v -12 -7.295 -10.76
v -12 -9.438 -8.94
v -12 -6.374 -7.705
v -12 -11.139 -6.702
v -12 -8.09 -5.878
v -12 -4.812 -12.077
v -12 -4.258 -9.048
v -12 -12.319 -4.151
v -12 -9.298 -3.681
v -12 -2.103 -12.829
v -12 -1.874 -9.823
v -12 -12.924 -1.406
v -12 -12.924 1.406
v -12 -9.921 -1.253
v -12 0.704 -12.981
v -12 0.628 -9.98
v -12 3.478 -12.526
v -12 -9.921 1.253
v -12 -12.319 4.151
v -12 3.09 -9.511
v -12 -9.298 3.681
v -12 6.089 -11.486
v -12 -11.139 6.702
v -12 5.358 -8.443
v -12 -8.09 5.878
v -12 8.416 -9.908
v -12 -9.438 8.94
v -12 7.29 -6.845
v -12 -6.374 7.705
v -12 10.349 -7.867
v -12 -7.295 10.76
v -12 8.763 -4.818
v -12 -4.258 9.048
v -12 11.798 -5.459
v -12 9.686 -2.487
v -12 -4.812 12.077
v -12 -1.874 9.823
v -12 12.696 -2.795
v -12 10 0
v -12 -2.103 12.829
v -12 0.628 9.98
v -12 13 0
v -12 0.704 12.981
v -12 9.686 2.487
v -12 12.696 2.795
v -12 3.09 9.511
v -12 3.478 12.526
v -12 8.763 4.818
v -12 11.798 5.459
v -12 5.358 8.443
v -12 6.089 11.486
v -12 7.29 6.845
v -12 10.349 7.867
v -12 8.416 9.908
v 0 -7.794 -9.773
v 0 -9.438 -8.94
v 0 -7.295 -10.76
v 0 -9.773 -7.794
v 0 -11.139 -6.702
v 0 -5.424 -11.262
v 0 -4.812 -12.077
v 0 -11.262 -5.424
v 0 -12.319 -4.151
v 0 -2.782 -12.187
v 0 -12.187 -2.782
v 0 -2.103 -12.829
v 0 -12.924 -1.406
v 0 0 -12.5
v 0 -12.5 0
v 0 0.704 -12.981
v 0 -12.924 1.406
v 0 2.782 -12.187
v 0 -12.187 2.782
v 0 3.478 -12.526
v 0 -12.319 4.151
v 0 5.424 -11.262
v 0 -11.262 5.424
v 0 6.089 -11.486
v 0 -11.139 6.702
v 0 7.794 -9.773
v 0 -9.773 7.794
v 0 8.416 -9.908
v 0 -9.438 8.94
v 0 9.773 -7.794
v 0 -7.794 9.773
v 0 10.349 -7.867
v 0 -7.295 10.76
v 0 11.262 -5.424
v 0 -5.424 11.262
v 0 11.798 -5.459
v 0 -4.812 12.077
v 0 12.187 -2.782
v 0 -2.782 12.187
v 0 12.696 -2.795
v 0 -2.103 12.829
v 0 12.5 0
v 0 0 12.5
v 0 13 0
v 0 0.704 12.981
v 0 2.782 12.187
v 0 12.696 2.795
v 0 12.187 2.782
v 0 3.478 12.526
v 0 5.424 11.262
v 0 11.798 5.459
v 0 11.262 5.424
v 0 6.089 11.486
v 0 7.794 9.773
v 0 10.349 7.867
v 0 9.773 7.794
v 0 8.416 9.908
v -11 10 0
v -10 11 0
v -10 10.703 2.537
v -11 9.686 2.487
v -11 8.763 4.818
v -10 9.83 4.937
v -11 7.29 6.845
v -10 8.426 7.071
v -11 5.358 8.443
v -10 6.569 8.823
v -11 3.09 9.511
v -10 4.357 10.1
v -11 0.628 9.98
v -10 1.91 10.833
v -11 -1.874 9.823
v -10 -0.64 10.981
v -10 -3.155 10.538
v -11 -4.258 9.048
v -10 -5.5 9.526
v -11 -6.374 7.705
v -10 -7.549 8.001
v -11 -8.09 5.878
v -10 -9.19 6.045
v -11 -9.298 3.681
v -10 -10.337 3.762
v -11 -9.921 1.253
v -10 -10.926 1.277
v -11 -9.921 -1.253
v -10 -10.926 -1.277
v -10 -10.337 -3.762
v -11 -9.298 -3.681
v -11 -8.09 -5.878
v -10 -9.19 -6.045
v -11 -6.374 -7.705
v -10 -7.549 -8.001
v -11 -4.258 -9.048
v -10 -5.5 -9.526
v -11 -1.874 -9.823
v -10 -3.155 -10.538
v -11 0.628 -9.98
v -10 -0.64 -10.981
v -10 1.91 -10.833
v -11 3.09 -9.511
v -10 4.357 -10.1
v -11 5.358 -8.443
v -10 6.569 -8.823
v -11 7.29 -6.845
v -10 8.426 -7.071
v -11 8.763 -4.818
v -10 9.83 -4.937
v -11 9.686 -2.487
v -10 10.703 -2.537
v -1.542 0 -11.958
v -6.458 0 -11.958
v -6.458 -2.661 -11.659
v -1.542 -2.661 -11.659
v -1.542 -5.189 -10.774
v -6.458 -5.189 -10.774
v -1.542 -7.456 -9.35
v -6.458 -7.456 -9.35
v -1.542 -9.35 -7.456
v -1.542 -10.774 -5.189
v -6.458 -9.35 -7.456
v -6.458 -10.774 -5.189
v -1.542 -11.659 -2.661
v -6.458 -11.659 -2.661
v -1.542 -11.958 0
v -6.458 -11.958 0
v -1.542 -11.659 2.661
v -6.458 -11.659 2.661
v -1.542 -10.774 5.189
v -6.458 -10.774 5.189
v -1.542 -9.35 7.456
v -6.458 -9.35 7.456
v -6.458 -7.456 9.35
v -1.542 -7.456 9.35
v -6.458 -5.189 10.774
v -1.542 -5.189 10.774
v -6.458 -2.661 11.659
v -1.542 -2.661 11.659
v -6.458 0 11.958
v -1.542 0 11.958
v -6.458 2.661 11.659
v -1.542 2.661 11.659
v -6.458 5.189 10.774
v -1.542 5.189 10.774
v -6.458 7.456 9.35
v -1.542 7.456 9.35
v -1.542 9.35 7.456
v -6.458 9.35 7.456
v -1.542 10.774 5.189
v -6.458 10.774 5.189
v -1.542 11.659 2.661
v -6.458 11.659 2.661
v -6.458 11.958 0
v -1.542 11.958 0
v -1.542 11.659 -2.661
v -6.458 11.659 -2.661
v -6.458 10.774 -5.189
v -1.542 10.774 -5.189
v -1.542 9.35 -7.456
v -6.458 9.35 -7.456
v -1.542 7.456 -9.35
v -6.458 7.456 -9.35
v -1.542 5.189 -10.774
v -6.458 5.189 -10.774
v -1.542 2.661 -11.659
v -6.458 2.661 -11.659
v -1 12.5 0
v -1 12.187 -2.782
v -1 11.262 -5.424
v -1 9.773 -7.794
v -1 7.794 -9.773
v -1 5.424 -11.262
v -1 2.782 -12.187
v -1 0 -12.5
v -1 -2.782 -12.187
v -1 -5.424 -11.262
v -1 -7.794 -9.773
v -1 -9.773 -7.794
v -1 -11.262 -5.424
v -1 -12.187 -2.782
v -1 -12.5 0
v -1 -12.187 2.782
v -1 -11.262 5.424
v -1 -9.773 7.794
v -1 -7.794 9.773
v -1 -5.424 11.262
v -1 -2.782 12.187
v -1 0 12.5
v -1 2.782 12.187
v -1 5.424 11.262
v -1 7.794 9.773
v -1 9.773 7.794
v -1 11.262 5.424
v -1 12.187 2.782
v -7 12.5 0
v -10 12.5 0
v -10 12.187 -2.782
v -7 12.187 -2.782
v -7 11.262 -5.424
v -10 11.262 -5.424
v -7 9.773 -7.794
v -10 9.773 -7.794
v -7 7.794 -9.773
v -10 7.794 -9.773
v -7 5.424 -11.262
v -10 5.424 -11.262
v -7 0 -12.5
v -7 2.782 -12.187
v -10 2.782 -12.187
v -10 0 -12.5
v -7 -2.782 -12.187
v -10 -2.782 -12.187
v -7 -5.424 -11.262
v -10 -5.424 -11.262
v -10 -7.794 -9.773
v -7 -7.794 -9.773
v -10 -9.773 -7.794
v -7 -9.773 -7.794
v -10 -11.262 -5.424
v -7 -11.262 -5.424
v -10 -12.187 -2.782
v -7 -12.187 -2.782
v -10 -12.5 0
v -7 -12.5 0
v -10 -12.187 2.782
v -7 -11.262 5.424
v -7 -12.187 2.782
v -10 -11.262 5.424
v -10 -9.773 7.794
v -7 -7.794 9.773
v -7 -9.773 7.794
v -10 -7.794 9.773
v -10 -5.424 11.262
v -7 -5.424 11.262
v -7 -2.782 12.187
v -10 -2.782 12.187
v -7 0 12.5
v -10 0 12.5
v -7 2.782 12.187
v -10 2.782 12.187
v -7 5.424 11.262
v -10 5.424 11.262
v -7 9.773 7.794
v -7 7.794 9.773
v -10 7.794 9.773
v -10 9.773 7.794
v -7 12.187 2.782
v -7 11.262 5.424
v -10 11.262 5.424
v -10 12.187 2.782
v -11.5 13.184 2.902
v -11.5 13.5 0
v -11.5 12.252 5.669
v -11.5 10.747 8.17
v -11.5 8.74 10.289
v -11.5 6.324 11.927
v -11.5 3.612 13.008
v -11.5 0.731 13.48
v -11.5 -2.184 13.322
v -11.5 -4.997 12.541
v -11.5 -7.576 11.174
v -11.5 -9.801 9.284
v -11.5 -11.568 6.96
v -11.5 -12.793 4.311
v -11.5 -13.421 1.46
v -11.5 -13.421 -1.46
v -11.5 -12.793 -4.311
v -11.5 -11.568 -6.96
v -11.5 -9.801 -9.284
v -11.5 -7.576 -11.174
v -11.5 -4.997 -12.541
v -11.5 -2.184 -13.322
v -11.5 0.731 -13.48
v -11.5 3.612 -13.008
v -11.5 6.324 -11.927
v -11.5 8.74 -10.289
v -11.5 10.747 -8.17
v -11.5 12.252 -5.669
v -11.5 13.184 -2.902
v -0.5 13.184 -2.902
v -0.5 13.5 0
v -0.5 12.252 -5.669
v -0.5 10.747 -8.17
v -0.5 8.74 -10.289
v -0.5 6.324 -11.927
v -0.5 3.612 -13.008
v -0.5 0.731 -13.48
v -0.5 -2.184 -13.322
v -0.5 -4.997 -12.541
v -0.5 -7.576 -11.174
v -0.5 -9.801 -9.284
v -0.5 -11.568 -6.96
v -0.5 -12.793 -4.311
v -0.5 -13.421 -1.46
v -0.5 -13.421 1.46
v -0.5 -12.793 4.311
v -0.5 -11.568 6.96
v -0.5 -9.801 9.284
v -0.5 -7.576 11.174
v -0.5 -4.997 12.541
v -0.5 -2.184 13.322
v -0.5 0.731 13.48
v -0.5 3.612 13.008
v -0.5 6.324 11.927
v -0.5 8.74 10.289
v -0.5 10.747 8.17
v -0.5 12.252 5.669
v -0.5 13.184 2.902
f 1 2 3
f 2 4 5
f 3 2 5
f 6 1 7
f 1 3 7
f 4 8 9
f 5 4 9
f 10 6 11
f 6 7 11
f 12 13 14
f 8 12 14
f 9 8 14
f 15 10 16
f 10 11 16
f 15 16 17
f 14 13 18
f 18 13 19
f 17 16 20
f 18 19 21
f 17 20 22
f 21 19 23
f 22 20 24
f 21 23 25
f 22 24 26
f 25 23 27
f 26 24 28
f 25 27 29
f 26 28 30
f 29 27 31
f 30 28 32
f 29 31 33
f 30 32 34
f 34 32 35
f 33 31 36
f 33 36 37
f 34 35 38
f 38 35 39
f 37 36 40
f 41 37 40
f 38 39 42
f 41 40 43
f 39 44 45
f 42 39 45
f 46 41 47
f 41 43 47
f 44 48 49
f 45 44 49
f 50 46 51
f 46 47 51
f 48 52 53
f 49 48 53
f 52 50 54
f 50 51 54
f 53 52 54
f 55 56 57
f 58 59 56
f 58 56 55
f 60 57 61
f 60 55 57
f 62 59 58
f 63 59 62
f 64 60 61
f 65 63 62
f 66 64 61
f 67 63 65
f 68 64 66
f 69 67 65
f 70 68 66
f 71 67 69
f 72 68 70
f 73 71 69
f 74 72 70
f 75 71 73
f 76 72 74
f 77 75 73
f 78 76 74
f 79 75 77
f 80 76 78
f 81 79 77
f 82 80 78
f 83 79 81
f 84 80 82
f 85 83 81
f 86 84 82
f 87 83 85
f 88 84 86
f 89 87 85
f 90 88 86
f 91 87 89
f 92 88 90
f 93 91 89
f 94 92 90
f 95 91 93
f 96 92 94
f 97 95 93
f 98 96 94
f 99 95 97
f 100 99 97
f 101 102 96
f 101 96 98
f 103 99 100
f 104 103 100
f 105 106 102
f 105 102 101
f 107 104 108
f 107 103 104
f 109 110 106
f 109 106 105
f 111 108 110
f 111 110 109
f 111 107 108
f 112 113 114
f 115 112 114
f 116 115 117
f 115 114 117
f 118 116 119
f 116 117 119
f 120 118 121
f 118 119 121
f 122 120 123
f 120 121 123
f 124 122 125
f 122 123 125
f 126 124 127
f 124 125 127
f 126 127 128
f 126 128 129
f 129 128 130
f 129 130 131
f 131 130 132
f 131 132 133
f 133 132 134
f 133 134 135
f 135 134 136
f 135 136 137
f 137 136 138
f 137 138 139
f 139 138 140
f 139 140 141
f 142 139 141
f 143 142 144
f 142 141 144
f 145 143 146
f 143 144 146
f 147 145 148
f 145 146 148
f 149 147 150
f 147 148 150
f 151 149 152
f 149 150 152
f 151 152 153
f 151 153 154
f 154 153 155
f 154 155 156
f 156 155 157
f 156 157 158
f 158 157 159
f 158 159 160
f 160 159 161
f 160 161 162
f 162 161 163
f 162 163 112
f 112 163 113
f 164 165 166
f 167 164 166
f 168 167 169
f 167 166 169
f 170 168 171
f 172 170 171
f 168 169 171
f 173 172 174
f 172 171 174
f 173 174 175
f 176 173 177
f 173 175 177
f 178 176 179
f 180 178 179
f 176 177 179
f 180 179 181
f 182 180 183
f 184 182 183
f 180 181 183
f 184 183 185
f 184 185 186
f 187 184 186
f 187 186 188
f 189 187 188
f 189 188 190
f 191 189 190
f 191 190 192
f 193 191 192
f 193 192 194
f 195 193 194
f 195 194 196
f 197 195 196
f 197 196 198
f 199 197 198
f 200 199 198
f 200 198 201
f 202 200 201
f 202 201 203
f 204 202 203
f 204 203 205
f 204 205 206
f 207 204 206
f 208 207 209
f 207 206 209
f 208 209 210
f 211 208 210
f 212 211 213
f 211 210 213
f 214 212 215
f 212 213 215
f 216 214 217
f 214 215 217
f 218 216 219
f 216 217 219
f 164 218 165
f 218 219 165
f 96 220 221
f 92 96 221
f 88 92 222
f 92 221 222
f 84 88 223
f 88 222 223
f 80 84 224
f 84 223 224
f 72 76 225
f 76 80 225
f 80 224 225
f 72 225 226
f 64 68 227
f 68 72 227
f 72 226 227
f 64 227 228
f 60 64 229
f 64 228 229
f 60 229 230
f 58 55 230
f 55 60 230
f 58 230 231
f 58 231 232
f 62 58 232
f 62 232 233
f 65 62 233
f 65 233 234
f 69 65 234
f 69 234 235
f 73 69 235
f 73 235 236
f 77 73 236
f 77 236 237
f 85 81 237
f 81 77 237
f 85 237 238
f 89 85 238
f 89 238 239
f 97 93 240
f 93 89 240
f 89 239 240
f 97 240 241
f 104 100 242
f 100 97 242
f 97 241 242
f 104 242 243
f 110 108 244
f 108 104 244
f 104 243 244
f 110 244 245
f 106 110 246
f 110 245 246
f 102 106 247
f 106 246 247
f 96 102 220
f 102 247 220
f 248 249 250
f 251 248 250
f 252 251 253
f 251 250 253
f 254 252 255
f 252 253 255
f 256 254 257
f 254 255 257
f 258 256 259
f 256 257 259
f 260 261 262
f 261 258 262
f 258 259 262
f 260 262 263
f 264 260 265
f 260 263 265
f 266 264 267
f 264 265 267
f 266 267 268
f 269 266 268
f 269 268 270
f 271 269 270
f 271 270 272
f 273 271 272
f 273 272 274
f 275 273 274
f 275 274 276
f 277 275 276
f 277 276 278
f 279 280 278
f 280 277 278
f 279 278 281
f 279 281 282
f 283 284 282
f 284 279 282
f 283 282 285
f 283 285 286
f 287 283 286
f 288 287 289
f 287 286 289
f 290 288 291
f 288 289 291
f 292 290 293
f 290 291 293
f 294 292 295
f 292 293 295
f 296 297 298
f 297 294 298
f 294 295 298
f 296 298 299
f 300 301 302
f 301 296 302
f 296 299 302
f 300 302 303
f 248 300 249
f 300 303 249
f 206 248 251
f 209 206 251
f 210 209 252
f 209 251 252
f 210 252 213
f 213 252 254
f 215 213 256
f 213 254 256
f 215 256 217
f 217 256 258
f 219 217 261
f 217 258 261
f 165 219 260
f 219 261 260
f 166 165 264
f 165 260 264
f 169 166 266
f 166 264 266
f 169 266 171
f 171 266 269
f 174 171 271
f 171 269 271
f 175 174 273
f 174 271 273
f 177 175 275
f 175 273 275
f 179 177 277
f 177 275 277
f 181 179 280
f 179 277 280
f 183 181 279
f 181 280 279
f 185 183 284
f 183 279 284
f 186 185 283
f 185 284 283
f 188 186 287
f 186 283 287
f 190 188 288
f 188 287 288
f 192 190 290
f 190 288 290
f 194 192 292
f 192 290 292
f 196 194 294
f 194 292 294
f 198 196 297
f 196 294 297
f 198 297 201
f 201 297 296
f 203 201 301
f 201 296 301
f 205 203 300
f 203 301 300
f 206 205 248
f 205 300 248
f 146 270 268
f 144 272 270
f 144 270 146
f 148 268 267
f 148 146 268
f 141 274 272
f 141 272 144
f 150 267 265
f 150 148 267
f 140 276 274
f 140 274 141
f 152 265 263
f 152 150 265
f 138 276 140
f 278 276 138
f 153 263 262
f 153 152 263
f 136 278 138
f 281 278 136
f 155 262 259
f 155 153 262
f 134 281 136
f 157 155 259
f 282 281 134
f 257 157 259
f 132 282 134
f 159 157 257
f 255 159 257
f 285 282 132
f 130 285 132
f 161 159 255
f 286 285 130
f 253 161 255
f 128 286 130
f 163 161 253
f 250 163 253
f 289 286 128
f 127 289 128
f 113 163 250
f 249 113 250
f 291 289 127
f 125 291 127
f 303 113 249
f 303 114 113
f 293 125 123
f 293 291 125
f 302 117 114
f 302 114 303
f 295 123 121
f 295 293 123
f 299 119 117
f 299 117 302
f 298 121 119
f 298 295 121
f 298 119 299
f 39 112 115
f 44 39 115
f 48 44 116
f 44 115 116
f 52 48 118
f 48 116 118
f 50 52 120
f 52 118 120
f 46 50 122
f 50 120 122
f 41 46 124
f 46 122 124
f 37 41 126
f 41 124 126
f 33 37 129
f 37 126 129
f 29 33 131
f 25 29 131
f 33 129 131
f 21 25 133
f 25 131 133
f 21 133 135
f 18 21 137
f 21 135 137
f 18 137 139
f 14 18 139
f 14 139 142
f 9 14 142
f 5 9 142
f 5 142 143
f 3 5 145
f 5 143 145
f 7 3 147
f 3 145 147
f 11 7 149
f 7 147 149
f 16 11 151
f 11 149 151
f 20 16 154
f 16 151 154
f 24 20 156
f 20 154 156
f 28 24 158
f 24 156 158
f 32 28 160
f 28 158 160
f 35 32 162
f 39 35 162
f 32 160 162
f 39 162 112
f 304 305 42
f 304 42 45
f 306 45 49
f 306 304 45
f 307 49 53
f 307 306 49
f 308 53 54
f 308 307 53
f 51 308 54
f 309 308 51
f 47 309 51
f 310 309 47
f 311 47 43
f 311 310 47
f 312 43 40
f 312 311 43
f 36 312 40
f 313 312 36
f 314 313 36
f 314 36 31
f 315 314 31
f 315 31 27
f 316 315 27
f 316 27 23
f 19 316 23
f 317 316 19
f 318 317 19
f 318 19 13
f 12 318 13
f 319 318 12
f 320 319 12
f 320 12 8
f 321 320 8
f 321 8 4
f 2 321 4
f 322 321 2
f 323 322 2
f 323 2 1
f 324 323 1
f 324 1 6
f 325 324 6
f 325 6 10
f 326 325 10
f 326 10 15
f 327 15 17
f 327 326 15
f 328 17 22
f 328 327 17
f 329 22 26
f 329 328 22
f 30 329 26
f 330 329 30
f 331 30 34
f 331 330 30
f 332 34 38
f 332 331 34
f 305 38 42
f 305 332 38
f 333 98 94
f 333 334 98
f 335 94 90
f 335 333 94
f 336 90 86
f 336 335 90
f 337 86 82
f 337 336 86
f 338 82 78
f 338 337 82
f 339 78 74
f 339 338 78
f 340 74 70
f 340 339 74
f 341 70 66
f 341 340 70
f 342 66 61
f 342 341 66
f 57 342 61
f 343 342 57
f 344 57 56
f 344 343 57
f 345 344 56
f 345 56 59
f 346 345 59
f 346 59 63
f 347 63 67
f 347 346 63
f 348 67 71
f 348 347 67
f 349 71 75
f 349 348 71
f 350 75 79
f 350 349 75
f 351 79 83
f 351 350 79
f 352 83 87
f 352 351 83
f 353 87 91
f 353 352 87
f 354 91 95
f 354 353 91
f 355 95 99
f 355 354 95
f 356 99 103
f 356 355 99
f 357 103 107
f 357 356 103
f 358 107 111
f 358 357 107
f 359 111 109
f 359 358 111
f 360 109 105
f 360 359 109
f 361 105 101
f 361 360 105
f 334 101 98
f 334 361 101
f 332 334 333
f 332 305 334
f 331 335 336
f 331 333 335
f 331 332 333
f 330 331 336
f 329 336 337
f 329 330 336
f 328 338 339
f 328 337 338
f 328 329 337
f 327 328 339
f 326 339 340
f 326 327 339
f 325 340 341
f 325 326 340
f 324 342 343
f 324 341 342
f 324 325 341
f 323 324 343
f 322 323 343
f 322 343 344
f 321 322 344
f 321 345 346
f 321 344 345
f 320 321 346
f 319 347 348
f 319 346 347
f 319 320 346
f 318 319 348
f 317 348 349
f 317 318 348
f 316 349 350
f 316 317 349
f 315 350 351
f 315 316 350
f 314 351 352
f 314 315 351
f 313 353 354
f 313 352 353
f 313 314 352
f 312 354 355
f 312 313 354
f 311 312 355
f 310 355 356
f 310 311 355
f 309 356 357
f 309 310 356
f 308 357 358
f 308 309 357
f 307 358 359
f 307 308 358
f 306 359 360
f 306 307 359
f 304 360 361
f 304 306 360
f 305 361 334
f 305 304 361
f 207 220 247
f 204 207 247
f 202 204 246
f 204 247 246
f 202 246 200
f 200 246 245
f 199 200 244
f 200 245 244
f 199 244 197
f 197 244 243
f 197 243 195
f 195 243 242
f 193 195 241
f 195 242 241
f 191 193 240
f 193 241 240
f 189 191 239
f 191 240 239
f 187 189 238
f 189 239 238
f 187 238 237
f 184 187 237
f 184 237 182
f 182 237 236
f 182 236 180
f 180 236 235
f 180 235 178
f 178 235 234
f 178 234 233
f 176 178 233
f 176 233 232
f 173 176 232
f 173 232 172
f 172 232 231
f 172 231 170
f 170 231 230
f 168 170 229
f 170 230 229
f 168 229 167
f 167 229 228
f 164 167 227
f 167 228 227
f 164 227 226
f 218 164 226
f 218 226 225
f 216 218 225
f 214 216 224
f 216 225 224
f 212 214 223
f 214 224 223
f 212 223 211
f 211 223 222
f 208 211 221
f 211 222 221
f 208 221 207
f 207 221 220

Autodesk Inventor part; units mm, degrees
ref_plane "YZ Plane" through (0, 0, 0) normal (1, 0, 0) x (0, 1, 0)
ref_plane "XZ Plane" through (0, 0, 0) normal (0, 1, 0) x (-1, 0, 0)
ref_plane "XY Plane" through (0, 0, 0) normal (0, 0, 1) x (1, 0, 0)
sketch "Skizze1" plane through (0, 0, 0) normal (0, 0, 1) x (1, 0, 0)
  line L0 (-14.4, 0) -> (2.4, 0) projected
  line L1 (0, -2.7) -> (0, 16.2) projected
  line L2 (0, 12.5) -> (-1, 12.5)
  line L3 (-1, 12.5) -> (-2, 11.5)
  line L4 (-2, 11.5) -> (-6, 11.5)
  line L5 (-6, 11.5) -> (-7, 12.5)
  line L6 (-7, 12.5) -> (-10, 12.5)
  line L7 (-10, 12.5) -> (-10, 11)
  line L8 (-0.5, 13.5) -> (-11.5, 13.5)
  line L9 (-12, 13) -> (-12, 10)
  line L10 (-12, 10) -> (-11, 10)
  line L11 (-11, 10) -> (-10, 11)
  line L12 (-11.5, 13.5) -> (-12, 13)
  line L13 (0, 13) -> (0, 12.5)
  line L14 (0, 13) -> (-0.5, 13.5)
  point P0 (0, 0)
  point P1 (0, 13.5)
  point P2 (-12, 13.5)
  dimension "d0" = 23
  dimension "d1" = 25
  dimension "d2" = 45
  dimension "d3" = 45
  dimension "d4" = 1
  dimension "d5" = 10
  dimension "d6" = 3
  dimension "d7" = 12
  dimension "d9" = 20
  dimension "d10" = 1
  dimension "d11" = 0.5
  dimension "d12" = 0.5
  dimension "d13" = 0.5
  dimension "d14" = 0.5
  dimension "d25" = 22
  dimension "d26" = 1
revolve "Umdrehung1" add sketch "Skizze1" angle 360 about axis through (-10, 0, 0) along (1, 0, 0)
hole "Bohrung1" at (0, 0, 0) direction (-1, 0, 0) diameter 23.917 depth 8 thread size "M25x1" class "6H" standard "ISO Metric profile"
equation "\"d12\" = d11"
equation "\"d14\" = d13"
properties part number "13_0204_034"
